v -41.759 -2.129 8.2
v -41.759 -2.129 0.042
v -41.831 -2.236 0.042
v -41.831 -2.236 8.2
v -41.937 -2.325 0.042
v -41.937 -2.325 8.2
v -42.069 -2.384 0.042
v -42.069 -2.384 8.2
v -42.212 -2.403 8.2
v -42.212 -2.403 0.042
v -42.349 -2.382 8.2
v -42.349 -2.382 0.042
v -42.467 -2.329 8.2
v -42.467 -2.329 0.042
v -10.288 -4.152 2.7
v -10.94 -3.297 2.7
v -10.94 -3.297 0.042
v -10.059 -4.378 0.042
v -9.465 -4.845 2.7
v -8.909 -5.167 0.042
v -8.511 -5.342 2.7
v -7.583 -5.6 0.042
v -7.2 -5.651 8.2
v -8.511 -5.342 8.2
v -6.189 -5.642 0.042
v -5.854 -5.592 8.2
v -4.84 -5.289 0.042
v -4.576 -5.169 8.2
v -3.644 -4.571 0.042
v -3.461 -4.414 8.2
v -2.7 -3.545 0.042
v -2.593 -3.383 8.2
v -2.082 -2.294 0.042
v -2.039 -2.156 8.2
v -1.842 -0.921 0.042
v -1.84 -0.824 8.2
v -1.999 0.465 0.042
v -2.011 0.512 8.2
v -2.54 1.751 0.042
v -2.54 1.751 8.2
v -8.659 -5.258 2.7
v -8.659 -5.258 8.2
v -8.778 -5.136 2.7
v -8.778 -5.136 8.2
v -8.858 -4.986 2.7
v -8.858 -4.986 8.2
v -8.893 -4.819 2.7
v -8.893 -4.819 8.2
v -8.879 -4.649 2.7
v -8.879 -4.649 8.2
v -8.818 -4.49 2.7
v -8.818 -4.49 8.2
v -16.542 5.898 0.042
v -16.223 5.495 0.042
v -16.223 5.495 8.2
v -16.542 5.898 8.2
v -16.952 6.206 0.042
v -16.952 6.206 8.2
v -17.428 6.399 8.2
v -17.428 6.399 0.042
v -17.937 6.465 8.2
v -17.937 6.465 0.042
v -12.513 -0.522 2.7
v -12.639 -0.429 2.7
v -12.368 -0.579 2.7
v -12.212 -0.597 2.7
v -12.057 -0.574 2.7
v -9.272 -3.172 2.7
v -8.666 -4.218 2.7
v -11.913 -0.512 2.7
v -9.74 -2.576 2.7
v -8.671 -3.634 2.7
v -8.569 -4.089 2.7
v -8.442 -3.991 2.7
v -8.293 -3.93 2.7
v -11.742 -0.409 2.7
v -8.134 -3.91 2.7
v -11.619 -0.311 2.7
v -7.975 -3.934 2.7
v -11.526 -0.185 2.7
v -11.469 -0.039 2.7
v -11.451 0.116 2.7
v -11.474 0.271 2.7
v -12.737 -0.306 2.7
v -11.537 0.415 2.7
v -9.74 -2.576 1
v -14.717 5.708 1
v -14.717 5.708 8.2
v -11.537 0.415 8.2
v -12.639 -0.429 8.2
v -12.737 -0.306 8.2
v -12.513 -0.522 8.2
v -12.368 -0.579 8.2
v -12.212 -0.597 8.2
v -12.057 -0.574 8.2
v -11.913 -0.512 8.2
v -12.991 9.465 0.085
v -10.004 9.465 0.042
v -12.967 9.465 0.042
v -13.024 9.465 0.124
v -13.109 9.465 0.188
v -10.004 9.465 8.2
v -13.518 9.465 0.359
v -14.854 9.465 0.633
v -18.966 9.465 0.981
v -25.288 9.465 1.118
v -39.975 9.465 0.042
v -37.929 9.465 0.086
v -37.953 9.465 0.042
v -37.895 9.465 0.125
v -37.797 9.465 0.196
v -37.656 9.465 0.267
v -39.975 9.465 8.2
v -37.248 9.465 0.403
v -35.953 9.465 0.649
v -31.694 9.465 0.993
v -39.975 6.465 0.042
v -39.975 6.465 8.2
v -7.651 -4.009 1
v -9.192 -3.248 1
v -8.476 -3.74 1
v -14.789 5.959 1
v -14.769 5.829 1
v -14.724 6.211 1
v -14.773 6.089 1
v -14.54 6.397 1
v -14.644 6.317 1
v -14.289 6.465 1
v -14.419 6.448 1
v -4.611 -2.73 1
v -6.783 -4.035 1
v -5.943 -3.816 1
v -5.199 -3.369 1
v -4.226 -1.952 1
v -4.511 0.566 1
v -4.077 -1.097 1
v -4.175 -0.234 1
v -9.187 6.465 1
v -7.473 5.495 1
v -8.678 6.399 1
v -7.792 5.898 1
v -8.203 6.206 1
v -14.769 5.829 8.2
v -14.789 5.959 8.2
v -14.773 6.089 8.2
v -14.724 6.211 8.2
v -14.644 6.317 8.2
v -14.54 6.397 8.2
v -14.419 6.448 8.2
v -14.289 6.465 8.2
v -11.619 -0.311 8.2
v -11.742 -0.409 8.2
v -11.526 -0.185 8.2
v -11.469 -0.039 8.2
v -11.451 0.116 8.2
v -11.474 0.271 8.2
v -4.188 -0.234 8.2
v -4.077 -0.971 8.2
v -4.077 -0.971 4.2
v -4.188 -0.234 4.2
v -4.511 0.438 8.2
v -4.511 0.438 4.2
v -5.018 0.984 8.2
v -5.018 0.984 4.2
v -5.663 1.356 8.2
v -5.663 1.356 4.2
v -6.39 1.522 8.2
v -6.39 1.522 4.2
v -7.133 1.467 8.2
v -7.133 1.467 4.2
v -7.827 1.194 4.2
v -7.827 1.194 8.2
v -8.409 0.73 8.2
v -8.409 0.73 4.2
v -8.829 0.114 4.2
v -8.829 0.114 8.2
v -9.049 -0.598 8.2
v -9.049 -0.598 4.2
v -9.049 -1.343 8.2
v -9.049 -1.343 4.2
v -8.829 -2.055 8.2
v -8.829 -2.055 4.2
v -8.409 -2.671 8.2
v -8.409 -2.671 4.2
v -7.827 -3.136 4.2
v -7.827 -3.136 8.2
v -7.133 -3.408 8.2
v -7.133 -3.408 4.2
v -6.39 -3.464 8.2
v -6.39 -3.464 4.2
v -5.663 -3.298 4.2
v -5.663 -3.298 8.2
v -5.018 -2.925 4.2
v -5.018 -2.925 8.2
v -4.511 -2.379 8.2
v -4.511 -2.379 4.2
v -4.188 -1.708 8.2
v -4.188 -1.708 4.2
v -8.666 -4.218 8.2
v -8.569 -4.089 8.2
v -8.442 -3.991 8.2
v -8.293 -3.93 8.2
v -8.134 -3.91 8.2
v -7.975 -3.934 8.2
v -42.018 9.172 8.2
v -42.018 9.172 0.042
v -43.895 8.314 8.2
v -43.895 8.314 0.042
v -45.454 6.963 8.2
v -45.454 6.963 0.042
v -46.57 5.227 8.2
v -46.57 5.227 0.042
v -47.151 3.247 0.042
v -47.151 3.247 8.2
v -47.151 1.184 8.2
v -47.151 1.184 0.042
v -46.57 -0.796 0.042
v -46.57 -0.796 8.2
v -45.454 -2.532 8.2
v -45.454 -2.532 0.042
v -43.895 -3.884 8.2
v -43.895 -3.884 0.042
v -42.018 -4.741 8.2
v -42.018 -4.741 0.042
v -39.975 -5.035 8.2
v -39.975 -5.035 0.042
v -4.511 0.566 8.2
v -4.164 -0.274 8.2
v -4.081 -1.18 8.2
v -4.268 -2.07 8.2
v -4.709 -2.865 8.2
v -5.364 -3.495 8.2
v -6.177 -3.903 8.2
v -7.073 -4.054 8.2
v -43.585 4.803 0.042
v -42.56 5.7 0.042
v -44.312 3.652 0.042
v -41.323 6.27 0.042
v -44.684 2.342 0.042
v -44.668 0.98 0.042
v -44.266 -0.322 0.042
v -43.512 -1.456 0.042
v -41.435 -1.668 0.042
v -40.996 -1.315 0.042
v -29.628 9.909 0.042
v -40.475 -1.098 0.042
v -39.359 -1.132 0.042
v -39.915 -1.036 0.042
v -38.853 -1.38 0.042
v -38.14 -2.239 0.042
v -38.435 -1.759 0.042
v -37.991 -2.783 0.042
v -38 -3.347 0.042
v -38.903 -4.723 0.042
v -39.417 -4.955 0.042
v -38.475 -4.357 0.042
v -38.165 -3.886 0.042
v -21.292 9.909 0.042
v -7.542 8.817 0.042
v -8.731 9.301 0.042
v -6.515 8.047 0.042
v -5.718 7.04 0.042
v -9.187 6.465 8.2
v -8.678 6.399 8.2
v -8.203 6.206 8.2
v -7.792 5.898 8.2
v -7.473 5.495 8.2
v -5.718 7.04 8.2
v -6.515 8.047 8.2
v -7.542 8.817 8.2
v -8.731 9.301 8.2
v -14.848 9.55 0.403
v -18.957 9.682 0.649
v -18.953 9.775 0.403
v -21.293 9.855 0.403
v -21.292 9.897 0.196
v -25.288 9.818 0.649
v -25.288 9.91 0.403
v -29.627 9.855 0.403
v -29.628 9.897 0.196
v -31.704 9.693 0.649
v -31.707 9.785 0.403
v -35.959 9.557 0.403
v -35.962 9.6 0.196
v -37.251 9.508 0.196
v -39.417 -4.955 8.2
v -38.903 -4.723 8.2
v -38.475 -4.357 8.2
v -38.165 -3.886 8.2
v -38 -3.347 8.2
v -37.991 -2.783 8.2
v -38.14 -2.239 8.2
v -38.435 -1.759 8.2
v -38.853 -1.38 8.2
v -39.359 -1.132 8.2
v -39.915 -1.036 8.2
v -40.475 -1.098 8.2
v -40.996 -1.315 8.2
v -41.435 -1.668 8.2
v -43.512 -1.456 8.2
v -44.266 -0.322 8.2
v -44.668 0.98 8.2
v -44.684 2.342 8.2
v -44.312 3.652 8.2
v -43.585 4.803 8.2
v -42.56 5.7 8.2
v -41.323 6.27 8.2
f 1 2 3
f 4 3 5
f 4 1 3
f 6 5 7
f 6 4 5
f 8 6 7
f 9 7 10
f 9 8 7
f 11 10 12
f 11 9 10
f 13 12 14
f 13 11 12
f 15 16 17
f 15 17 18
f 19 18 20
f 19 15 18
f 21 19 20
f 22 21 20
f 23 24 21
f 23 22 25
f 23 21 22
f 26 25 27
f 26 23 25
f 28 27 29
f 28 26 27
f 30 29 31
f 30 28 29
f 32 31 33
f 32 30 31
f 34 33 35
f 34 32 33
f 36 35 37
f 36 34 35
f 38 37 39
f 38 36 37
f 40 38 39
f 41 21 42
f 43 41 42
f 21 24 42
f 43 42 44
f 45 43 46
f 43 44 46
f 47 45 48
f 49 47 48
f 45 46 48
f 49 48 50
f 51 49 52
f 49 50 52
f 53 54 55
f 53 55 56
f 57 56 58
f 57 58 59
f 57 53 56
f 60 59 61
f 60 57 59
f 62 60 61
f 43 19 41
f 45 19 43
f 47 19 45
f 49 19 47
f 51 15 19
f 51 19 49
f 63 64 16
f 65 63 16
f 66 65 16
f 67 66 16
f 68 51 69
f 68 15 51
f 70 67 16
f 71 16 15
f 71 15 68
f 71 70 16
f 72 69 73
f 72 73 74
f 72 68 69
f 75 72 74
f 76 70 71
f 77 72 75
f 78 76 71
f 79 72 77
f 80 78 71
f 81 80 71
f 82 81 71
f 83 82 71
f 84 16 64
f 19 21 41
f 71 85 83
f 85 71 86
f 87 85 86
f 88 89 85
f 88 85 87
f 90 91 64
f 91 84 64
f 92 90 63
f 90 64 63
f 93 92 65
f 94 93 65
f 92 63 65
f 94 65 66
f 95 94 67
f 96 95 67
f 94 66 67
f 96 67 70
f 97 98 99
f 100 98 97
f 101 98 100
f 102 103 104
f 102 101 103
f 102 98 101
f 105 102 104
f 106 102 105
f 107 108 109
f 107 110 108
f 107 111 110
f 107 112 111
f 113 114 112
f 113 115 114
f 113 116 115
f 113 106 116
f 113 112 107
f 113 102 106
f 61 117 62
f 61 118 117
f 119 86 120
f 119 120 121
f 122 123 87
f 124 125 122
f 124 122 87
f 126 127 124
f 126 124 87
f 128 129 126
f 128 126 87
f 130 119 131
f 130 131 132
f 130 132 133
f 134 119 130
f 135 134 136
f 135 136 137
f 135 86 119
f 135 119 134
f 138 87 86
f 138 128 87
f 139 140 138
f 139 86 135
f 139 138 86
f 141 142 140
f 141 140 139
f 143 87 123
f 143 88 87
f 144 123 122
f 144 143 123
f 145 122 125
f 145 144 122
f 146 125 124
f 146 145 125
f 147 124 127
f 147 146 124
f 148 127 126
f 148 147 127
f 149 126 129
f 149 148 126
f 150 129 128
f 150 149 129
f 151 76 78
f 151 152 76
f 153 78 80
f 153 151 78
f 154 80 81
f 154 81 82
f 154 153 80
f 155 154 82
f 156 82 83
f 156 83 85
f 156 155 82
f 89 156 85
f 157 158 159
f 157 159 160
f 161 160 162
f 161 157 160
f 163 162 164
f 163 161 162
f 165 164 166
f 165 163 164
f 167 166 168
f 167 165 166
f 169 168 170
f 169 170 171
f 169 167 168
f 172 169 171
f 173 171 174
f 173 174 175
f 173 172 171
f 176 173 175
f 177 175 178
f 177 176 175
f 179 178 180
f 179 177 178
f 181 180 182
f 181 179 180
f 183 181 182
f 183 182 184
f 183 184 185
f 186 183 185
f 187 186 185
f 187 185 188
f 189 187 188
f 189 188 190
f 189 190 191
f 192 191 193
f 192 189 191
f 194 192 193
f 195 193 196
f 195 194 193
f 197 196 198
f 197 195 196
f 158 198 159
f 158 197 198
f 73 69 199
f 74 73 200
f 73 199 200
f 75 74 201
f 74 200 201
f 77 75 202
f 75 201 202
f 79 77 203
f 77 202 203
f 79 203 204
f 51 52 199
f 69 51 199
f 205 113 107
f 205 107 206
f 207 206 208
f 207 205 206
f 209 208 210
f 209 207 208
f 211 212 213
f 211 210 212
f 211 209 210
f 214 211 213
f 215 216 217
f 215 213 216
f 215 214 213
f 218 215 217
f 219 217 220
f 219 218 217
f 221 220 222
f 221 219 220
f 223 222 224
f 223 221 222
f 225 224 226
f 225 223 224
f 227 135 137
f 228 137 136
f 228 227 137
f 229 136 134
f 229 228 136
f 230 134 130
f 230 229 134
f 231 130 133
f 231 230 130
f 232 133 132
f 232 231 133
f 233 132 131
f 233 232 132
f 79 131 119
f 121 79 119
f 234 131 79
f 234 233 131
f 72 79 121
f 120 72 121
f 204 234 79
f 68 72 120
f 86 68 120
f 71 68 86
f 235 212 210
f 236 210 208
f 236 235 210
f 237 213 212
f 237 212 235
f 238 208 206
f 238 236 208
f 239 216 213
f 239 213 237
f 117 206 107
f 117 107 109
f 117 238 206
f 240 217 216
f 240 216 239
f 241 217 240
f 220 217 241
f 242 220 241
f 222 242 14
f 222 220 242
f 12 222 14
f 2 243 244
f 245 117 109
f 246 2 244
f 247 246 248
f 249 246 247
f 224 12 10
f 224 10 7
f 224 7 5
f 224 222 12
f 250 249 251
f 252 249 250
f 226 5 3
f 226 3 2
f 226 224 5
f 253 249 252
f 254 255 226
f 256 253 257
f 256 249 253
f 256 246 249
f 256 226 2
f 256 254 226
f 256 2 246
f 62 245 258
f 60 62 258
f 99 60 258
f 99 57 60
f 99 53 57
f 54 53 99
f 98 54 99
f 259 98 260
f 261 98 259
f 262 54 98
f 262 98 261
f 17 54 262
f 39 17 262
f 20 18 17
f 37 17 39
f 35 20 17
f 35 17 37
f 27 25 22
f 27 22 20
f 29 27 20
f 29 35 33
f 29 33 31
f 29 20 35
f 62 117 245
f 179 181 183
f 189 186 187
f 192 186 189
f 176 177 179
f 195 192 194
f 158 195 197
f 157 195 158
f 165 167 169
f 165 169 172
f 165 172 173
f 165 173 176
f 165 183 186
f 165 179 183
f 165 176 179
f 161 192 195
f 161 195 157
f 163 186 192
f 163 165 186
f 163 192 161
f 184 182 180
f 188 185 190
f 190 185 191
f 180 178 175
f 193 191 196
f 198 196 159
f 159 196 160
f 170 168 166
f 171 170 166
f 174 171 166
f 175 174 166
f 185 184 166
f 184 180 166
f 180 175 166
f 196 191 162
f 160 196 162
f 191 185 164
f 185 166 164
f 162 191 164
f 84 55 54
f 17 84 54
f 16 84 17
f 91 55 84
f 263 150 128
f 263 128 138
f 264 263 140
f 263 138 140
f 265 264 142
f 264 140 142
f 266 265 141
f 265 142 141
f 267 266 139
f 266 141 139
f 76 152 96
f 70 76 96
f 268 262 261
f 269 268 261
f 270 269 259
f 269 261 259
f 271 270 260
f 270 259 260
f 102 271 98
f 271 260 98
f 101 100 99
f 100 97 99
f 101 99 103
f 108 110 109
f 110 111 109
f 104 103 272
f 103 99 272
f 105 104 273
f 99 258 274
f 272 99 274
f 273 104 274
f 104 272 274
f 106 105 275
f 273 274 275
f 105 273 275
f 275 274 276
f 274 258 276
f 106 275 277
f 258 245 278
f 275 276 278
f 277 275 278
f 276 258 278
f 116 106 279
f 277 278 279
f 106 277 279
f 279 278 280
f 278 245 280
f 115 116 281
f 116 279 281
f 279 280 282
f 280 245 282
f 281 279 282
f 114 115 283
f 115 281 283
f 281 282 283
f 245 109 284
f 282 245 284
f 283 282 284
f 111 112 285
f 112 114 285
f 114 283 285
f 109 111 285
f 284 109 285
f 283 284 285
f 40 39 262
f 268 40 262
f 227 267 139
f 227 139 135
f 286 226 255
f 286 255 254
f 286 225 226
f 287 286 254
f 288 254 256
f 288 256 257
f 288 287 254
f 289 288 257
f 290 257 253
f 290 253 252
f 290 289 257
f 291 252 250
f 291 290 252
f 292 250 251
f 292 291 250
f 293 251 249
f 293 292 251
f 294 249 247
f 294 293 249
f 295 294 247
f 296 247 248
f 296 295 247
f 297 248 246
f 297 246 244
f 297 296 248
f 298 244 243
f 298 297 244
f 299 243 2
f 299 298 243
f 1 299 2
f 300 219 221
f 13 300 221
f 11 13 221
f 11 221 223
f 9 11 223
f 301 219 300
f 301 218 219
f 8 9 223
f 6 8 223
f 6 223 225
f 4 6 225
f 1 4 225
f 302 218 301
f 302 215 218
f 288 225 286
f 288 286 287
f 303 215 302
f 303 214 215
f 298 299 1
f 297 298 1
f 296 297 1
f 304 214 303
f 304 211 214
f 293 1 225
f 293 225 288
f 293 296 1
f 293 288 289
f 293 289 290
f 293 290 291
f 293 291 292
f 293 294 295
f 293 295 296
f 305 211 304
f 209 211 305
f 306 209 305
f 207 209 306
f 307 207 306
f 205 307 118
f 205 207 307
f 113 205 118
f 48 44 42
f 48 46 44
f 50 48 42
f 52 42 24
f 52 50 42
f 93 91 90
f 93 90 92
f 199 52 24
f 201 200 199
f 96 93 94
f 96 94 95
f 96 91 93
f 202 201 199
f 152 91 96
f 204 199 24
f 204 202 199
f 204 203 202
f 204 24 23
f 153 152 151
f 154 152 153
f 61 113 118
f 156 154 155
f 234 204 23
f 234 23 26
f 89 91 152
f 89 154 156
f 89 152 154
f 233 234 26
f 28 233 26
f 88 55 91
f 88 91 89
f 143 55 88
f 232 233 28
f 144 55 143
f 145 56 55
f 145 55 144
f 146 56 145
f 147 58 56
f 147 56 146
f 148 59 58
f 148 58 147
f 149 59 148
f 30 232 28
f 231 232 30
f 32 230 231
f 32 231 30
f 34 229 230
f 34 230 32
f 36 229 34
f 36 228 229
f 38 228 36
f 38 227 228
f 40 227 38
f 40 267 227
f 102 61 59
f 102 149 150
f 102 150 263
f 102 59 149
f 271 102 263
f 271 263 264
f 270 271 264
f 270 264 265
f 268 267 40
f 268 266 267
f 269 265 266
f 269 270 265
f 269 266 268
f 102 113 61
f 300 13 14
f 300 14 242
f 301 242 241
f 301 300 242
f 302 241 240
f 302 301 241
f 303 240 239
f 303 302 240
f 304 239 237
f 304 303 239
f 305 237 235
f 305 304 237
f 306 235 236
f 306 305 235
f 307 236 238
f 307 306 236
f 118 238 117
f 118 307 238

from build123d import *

# Parameters (mm, degrees)
F1_DEPTH       = 8.2
F2_DEPTH       = 1
F4_DEPTH       = 5.5
F16_DEPTH      = 5.5
F5_R           = 2
F17_R          = 0.5
F18_R          = 2
F19_R          = 5
F20_R          = 0.5
F6_R           = 0.6
F8_DEPTH       = 1.5
F9_T4_ANGLE    = 11.9082557293
F10_T4_ANGLE   = 11.9082557293
F11_R          = 2.5
F12_DEPTH      = 4
F13_W          = 47.1088511404
F13_H          = 11.3580938778
F14_DEPTH      = 9.9662867391
F14_DEPTH_BACK = 5.6739057342


# Not quite as in the source:
# - a fillet or chamfer that OpenCascade refuses, or shapes differently, is made with other operations: its cross-section is extruded or revolved along the edge and cut away or added


with BuildPart() as f1:
    # F0 (on Top) → F1 (new body, symmetric)
    with BuildSketch(Plane.XY):
        with BuildLine():
            Line((-7.1751643711, 9.4652866391), (-39.9751643711, 9.4652866391))
            ThreePointArc((-39.9751643711, 9.4652866391), (-47.2251643711, 2.2152866391), (-39.9751643711, -5.0347133609))
            ThreePointArc((-39.9751643711, -5.0347133609), (-38.4191911607, -1.778151636), (-41.9303407523, -2.6136607293))
            ThreePointArc((-41.9303407523, -2.6136607293), (-44.6187082764, 2.7152866391), (-39.9751643711, 6.4652866391))
            Line((-39.9751643711, 6.4652866391), (-16.8055898067, 6.4652866391))
            Line((-16.8055898067, 6.4652866391), (-10.9400612438, -3.2965922013))
            ThreePointArc((-10.9400612438, -3.2965922013), (-4.2162549033, -4.9730254077), (-2.5398216969, 1.7507809328))
            Line((-2.5398216969, 1.7507809328), (-7.1751643711, 9.4652866391))
        make_face()
        with BuildLine():
            Line((-15.1723030506, 6.4652866391), (-8.0558393276, 6.4652866391))
            Line((-8.0558393276, 6.4652866391), (-4.5113064885, 0.5661933605))
            ThreePointArc((-4.5113064885, 0.5661933605), (-5.5548006272, -3.6190330351), (-9.7400270228, -2.5755388964))
            Line((-9.7400270228, -2.5755388964), (-15.1723030506, 6.4652866391))
        make_face(mode=Mode.SUBTRACT)
    extrude(amount=F1_DEPTH, both=True)

    # F0 (on Top) → F2 (join, symmetric)
    with BuildSketch(Plane.XY):
        with BuildLine():
            Line((-4.5113064885, 0.5661933605), (-8.0558393276, 6.4652866391))
            Line((-8.0558393276, 6.4652866391), (-15.1723030506, 6.4652866391))
            Line((-15.1723030506, 6.4652866391), (-9.7400270228, -2.5755388964))
            ThreePointArc((-9.7400270228, -2.5755388964), (-5.5548006272, -3.6190330351), (-4.5113064885, 0.5661933605))
        make_face()
    extrude(amount=F2_DEPTH, both=True)

    # F3 (on face) → F4 (cut)
    with BuildSketch(Plane.XY.offset(8.2)):
        Polygon((-10.0407510024, -6.6778307382), (-6.7399414704, -0.7729056342), (-8.2276463966, 1.7030511502), (-13.2597389706, -1.3205351088), align=None)
    extrude(amount=-F4_DEPTH, mode=Mode.SUBTRACT)

    # F15 (on face) → F16 (cut)
    with BuildSketch(Plane(origin=(0, 0, -8.2), x_dir=(1, 0, 0), z_dir=(0, 0, -1))):
        with BuildLine():
            Line((-12.42776617, 0.8206354168), (-11.227731949, 0.099582112))
            Line((-11.227731949, 0.099582112), (-9.7400270228, 2.5755388964))
            ThreePointArc((-9.7400270228, 2.5755388964), (-9.166526222, 3.2712544759), (-8.4146795695, 3.7688988741))
            Line((-8.4146795695, 3.7688988741), (-9.130817206, 5.0500206919))
            ThreePointArc((-9.130817206, 5.0500206919), (-10.1500636556, 4.2915796291), (-10.9400612438, 3.2965922013))
            Line((-10.9400612438, 3.2965922013), (-12.42776617, 0.8206354168))
        make_face()
    extrude(amount=-F16_DEPTH, mode=Mode.SUBTRACT)

    # F5
    f5_edges = [f1.edges().sort_by_distance(p)[0] for p in [
        (-16.80559, 6.465287, 0),
    ]]
    fillet(f5_edges, radius=F5_R)

    # F17
    f17_edges = [f1.edges().sort_by_distance(p)[0] for p in [
        (-15.172303, 6.465287, -4.6),
        (-15.172303, 6.465287, 4.6),
    ]]
    fillet(f17_edges, radius=F17_R)

    # F18
    f18_edges = [f1.edges().sort_by_distance(p)[0] for p in [
        (-8.055839, 6.465287, -4.6),
        (-8.055839, 6.465287, 4.6),
    ]]
    fillet(f18_edges, radius=F18_R)

    # F19
    f19_edges = [f1.edges().sort_by_distance(p)[0] for p in [
        (-7.175164, 9.465287, 0),
    ]]
    fillet(f19_edges, radius=F19_R)

    # F20
    f20_edges = [f1.edges().sort_by_distance(p)[0] for p in [
        (-41.930341, -2.613661, 0),
    ]]
    fillet(f20_edges, radius=F20_R)

    # F6
    f6_edges = [f1.edges().sort_by_distance(p)[0] for p in [
        (-12.427766, -0.820635, 5.45),
        (-11.227732, -0.099582, 5.45),
        (-8.41468, -3.768899, 5.45),
        (-9.130817, -5.050021, 5.45),
        (-9.130817, -5.050021, -5.45),
        (-8.41468, -3.768899, -5.45),
        (-12.427766, -0.820635, -5.45),
        (-11.227732, -0.099582, -5.45),
    ]]
    fillet(f6_edges, radius=F6_R)

    # F7 (on Top) → F8 (join, symmetric)
    with BuildSketch(Plane.XY):
        with BuildLine():
            ThreePointArc((-12.9599444568, 9.4652866391), (-25.4599444568, 9.9652866391), (-37.9599444568, 9.4652866391))
            Line((-37.9599444568, 9.4652866391), (-12.9599444568, 9.4652866391))
        make_face()
    extrude(amount=F8_DEPTH, both=True)

    # F9: fillet of radius 1.5 on 1 edges, made by hand


with BuildPart() as f9_tool2:
    # F9_s3 → F9_t4 (revolve)
    with BuildSketch(Plane(origin=(-10.0676204433, 1.0500008536, 0), x_dir=(0, 0, 1), z_dir=(0.9946052642, -0.1037321959, 0))):
        with BuildLine():
            ThreePointArc((1.5, -6.6147867599), (1.0606601718, -7.6754469317), (0, -8.1147867599))
            Line((0, -8.1147867599), (1.5, -8.1147867599))
            Line((1.5, -8.1147867599), (1.5, -6.6147867599))
        make_face()
    revolve(axis=Axis((-25.4599444568, -146.5347133609, 1.5), (0, 0, 1)), revolution_arc=F9_T4_ANGLE)

    split(bisect_by=Plane.XZ.offset(-9.4652866391), keep=Keep.BOTTOM)


with BuildPart() as f1_1:
    add(f1.part)

    # F9_t1: cut F9_tool2
    add(f9_tool2.part, mode=Mode.SUBTRACT)

    # F10: fillet of radius 1.5 on 1 edges, made by hand


with BuildPart() as f10_tool2:
    # F10_s3 → F10_t4 (revolve)
    with BuildSketch(Plane(origin=(-10.0676204433, 1.0500008536, 0), x_dir=(0, 0, 1), z_dir=(0.9946052642, -0.1037321959, 0))):
        with BuildLine():
            ThreePointArc((0, -8.1147867599), (-1.0606601718, -7.6754469317), (-1.5, -6.6147867599))
            Line((-1.5, -6.6147867599), (-1.5, -8.1147867599))
            Line((-1.5, -8.1147867599), (0, -8.1147867599))
        make_face()
    revolve(axis=Axis((-25.4599444568, -146.5347133609, -1.5), (0, 0, 1)), revolution_arc=F10_T4_ANGLE)

    split(bisect_by=Plane.XZ.offset(-9.4652866391), keep=Keep.BOTTOM)


with BuildPart() as f1_2:
    add(f1_1.part)

    # F10_t1: cut F10_tool2
    add(f10_tool2.part, mode=Mode.SUBTRACT)

    # F13 (on Front) → F14 (cut, two sides)
    with BuildSketch(Plane.XZ) as f14_sk:
        with Locations((-24.7634426923, -5.6371351529)):
            Rectangle(F13_W, F13_H)
    extrude(amount=-F14_DEPTH, mode=Mode.SUBTRACT)
    extrude(f14_sk.sketch, amount=F14_DEPTH_BACK, mode=Mode.SUBTRACT)


with BuildPart() as f12:
    # F11 (on face) → F12 (new body)
    with BuildSketch(Plane.XY.offset(8.2)):
        with Locations((-6.5767139877, -0.9707484622)):
            Circle(F11_R)
    extrude(amount=-F12_DEPTH)


solid = Compound([f1_2.part, f12.part])
